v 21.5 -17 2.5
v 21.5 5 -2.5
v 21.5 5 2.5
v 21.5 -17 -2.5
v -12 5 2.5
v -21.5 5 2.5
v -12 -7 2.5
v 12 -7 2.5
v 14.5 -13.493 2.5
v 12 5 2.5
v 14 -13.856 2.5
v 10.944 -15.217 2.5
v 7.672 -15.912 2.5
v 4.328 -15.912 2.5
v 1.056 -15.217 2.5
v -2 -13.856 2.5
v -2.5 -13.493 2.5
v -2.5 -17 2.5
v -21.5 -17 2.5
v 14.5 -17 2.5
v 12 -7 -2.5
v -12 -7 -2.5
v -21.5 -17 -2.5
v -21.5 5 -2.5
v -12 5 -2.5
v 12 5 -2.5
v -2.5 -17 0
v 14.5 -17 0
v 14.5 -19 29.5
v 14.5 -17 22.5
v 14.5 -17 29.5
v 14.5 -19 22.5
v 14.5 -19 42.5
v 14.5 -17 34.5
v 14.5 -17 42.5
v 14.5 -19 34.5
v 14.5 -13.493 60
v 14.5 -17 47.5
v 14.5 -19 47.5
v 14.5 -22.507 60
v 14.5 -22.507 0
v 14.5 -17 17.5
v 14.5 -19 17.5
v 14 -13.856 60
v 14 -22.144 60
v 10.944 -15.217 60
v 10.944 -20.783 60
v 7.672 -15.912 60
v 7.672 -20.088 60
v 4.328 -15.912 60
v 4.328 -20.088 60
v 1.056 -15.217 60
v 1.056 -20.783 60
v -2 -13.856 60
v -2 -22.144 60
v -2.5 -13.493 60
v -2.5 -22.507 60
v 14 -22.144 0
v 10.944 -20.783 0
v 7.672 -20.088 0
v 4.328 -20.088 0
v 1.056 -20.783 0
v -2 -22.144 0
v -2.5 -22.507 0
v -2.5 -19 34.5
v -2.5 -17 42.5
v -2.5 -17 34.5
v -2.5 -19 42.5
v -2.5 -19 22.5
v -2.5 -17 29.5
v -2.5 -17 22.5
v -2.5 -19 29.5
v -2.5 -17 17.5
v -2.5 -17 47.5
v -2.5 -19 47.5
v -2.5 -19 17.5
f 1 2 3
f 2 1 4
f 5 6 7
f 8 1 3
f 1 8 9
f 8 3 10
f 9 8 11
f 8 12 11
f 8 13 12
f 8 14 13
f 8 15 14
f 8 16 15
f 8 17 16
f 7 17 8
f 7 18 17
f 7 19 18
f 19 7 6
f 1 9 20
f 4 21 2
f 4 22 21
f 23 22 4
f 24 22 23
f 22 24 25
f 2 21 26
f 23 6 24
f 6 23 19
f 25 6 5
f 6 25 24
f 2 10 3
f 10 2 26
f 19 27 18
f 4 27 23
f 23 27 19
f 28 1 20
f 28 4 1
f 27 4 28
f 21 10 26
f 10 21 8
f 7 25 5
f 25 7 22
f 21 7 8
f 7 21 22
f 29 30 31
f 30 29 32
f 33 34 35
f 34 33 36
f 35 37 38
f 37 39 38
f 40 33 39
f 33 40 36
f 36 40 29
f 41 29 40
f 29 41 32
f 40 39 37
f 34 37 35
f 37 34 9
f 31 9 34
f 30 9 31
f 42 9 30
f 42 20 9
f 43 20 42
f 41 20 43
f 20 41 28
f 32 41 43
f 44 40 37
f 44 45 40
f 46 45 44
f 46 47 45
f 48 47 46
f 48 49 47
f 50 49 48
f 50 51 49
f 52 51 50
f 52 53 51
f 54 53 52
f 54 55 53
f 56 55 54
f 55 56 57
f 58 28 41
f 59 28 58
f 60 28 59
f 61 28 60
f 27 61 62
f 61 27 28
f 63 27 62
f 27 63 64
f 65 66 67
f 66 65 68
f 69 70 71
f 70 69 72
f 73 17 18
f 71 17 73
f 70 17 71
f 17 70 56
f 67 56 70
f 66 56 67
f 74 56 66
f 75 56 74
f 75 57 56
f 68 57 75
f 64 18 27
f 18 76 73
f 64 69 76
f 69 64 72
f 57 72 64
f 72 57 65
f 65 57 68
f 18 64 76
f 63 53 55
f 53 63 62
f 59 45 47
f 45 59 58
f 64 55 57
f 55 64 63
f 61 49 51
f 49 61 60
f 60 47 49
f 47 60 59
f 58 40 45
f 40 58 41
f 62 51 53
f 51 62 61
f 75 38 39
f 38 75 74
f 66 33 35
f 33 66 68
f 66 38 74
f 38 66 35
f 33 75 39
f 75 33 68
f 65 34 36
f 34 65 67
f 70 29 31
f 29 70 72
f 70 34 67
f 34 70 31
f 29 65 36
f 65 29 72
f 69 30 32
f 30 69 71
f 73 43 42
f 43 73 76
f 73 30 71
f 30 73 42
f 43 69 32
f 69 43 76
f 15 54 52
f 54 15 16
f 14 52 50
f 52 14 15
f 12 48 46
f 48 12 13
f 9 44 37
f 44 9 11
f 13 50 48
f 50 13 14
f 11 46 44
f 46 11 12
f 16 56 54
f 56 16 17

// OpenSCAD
//translate([0,0,55])
//cylinder(h = 55, r1 = 26, r2 = 26, center = true);

//translate([0,0,0])
//cube([24,14,30],true);

difference() {
    block();    
}

//translate([0,0,10])
//cylinder(h = 2, r1=15, r2=15, center=true);


module fill_gaps() 
{
    difference() {
        translate([0,0, -7.5])
        cylinder(h = 14, r1=36, r2=36);
        
        translate([0,11,1])
        cube([160,60,22], true);
        
        translate([29,0,1])
        cube([20,100,20], true);

        translate([-29,0,1])
        cube([20,100,20], true);
    }
}


module gluestick() {
    translate([0,0,2])
    cylinder(h = 100, r1 = 16, r2 = 16);
    //translate([0,0, 32])
    //cylinder(h = 32, r1 = 28, r2 = 28);
}

module vertical_stick()
{
    translate([6,0,0])
    {
        difference() {
        // retangulo vertical do suporte
        translate([-8.5,-30,0])
        cube([17,20,60]);

        //cilindro negativo para prender no mastro
        translate([0,-36,-20])
        cylinder(h = 102.5, r1 = 16, r2 = 16);
        
        // buraco para tie-wrap
        translate([10, -18, 45])
        cube ([50,2,5], true);

        // buraco para tie-wrap
        translate([10, -18, 32])
        cube ([50,2,5], true);
            
        // buraco para tie-wrap
        translate([10, -18, 20])
        cube ([50,2,5], true);
            
        gluestick();
    }
}
}

module block() {
    difference() {
        union() {
            difference () {
                // base ao redor do servo
                translate([0,-6,0])
                cube([43,22,5], true);
        
                // servo
                translate([0,0,0])
                cube([24,14,100],true);
            }                 
        }            
    }
    
    vertical_stick();
    
}
